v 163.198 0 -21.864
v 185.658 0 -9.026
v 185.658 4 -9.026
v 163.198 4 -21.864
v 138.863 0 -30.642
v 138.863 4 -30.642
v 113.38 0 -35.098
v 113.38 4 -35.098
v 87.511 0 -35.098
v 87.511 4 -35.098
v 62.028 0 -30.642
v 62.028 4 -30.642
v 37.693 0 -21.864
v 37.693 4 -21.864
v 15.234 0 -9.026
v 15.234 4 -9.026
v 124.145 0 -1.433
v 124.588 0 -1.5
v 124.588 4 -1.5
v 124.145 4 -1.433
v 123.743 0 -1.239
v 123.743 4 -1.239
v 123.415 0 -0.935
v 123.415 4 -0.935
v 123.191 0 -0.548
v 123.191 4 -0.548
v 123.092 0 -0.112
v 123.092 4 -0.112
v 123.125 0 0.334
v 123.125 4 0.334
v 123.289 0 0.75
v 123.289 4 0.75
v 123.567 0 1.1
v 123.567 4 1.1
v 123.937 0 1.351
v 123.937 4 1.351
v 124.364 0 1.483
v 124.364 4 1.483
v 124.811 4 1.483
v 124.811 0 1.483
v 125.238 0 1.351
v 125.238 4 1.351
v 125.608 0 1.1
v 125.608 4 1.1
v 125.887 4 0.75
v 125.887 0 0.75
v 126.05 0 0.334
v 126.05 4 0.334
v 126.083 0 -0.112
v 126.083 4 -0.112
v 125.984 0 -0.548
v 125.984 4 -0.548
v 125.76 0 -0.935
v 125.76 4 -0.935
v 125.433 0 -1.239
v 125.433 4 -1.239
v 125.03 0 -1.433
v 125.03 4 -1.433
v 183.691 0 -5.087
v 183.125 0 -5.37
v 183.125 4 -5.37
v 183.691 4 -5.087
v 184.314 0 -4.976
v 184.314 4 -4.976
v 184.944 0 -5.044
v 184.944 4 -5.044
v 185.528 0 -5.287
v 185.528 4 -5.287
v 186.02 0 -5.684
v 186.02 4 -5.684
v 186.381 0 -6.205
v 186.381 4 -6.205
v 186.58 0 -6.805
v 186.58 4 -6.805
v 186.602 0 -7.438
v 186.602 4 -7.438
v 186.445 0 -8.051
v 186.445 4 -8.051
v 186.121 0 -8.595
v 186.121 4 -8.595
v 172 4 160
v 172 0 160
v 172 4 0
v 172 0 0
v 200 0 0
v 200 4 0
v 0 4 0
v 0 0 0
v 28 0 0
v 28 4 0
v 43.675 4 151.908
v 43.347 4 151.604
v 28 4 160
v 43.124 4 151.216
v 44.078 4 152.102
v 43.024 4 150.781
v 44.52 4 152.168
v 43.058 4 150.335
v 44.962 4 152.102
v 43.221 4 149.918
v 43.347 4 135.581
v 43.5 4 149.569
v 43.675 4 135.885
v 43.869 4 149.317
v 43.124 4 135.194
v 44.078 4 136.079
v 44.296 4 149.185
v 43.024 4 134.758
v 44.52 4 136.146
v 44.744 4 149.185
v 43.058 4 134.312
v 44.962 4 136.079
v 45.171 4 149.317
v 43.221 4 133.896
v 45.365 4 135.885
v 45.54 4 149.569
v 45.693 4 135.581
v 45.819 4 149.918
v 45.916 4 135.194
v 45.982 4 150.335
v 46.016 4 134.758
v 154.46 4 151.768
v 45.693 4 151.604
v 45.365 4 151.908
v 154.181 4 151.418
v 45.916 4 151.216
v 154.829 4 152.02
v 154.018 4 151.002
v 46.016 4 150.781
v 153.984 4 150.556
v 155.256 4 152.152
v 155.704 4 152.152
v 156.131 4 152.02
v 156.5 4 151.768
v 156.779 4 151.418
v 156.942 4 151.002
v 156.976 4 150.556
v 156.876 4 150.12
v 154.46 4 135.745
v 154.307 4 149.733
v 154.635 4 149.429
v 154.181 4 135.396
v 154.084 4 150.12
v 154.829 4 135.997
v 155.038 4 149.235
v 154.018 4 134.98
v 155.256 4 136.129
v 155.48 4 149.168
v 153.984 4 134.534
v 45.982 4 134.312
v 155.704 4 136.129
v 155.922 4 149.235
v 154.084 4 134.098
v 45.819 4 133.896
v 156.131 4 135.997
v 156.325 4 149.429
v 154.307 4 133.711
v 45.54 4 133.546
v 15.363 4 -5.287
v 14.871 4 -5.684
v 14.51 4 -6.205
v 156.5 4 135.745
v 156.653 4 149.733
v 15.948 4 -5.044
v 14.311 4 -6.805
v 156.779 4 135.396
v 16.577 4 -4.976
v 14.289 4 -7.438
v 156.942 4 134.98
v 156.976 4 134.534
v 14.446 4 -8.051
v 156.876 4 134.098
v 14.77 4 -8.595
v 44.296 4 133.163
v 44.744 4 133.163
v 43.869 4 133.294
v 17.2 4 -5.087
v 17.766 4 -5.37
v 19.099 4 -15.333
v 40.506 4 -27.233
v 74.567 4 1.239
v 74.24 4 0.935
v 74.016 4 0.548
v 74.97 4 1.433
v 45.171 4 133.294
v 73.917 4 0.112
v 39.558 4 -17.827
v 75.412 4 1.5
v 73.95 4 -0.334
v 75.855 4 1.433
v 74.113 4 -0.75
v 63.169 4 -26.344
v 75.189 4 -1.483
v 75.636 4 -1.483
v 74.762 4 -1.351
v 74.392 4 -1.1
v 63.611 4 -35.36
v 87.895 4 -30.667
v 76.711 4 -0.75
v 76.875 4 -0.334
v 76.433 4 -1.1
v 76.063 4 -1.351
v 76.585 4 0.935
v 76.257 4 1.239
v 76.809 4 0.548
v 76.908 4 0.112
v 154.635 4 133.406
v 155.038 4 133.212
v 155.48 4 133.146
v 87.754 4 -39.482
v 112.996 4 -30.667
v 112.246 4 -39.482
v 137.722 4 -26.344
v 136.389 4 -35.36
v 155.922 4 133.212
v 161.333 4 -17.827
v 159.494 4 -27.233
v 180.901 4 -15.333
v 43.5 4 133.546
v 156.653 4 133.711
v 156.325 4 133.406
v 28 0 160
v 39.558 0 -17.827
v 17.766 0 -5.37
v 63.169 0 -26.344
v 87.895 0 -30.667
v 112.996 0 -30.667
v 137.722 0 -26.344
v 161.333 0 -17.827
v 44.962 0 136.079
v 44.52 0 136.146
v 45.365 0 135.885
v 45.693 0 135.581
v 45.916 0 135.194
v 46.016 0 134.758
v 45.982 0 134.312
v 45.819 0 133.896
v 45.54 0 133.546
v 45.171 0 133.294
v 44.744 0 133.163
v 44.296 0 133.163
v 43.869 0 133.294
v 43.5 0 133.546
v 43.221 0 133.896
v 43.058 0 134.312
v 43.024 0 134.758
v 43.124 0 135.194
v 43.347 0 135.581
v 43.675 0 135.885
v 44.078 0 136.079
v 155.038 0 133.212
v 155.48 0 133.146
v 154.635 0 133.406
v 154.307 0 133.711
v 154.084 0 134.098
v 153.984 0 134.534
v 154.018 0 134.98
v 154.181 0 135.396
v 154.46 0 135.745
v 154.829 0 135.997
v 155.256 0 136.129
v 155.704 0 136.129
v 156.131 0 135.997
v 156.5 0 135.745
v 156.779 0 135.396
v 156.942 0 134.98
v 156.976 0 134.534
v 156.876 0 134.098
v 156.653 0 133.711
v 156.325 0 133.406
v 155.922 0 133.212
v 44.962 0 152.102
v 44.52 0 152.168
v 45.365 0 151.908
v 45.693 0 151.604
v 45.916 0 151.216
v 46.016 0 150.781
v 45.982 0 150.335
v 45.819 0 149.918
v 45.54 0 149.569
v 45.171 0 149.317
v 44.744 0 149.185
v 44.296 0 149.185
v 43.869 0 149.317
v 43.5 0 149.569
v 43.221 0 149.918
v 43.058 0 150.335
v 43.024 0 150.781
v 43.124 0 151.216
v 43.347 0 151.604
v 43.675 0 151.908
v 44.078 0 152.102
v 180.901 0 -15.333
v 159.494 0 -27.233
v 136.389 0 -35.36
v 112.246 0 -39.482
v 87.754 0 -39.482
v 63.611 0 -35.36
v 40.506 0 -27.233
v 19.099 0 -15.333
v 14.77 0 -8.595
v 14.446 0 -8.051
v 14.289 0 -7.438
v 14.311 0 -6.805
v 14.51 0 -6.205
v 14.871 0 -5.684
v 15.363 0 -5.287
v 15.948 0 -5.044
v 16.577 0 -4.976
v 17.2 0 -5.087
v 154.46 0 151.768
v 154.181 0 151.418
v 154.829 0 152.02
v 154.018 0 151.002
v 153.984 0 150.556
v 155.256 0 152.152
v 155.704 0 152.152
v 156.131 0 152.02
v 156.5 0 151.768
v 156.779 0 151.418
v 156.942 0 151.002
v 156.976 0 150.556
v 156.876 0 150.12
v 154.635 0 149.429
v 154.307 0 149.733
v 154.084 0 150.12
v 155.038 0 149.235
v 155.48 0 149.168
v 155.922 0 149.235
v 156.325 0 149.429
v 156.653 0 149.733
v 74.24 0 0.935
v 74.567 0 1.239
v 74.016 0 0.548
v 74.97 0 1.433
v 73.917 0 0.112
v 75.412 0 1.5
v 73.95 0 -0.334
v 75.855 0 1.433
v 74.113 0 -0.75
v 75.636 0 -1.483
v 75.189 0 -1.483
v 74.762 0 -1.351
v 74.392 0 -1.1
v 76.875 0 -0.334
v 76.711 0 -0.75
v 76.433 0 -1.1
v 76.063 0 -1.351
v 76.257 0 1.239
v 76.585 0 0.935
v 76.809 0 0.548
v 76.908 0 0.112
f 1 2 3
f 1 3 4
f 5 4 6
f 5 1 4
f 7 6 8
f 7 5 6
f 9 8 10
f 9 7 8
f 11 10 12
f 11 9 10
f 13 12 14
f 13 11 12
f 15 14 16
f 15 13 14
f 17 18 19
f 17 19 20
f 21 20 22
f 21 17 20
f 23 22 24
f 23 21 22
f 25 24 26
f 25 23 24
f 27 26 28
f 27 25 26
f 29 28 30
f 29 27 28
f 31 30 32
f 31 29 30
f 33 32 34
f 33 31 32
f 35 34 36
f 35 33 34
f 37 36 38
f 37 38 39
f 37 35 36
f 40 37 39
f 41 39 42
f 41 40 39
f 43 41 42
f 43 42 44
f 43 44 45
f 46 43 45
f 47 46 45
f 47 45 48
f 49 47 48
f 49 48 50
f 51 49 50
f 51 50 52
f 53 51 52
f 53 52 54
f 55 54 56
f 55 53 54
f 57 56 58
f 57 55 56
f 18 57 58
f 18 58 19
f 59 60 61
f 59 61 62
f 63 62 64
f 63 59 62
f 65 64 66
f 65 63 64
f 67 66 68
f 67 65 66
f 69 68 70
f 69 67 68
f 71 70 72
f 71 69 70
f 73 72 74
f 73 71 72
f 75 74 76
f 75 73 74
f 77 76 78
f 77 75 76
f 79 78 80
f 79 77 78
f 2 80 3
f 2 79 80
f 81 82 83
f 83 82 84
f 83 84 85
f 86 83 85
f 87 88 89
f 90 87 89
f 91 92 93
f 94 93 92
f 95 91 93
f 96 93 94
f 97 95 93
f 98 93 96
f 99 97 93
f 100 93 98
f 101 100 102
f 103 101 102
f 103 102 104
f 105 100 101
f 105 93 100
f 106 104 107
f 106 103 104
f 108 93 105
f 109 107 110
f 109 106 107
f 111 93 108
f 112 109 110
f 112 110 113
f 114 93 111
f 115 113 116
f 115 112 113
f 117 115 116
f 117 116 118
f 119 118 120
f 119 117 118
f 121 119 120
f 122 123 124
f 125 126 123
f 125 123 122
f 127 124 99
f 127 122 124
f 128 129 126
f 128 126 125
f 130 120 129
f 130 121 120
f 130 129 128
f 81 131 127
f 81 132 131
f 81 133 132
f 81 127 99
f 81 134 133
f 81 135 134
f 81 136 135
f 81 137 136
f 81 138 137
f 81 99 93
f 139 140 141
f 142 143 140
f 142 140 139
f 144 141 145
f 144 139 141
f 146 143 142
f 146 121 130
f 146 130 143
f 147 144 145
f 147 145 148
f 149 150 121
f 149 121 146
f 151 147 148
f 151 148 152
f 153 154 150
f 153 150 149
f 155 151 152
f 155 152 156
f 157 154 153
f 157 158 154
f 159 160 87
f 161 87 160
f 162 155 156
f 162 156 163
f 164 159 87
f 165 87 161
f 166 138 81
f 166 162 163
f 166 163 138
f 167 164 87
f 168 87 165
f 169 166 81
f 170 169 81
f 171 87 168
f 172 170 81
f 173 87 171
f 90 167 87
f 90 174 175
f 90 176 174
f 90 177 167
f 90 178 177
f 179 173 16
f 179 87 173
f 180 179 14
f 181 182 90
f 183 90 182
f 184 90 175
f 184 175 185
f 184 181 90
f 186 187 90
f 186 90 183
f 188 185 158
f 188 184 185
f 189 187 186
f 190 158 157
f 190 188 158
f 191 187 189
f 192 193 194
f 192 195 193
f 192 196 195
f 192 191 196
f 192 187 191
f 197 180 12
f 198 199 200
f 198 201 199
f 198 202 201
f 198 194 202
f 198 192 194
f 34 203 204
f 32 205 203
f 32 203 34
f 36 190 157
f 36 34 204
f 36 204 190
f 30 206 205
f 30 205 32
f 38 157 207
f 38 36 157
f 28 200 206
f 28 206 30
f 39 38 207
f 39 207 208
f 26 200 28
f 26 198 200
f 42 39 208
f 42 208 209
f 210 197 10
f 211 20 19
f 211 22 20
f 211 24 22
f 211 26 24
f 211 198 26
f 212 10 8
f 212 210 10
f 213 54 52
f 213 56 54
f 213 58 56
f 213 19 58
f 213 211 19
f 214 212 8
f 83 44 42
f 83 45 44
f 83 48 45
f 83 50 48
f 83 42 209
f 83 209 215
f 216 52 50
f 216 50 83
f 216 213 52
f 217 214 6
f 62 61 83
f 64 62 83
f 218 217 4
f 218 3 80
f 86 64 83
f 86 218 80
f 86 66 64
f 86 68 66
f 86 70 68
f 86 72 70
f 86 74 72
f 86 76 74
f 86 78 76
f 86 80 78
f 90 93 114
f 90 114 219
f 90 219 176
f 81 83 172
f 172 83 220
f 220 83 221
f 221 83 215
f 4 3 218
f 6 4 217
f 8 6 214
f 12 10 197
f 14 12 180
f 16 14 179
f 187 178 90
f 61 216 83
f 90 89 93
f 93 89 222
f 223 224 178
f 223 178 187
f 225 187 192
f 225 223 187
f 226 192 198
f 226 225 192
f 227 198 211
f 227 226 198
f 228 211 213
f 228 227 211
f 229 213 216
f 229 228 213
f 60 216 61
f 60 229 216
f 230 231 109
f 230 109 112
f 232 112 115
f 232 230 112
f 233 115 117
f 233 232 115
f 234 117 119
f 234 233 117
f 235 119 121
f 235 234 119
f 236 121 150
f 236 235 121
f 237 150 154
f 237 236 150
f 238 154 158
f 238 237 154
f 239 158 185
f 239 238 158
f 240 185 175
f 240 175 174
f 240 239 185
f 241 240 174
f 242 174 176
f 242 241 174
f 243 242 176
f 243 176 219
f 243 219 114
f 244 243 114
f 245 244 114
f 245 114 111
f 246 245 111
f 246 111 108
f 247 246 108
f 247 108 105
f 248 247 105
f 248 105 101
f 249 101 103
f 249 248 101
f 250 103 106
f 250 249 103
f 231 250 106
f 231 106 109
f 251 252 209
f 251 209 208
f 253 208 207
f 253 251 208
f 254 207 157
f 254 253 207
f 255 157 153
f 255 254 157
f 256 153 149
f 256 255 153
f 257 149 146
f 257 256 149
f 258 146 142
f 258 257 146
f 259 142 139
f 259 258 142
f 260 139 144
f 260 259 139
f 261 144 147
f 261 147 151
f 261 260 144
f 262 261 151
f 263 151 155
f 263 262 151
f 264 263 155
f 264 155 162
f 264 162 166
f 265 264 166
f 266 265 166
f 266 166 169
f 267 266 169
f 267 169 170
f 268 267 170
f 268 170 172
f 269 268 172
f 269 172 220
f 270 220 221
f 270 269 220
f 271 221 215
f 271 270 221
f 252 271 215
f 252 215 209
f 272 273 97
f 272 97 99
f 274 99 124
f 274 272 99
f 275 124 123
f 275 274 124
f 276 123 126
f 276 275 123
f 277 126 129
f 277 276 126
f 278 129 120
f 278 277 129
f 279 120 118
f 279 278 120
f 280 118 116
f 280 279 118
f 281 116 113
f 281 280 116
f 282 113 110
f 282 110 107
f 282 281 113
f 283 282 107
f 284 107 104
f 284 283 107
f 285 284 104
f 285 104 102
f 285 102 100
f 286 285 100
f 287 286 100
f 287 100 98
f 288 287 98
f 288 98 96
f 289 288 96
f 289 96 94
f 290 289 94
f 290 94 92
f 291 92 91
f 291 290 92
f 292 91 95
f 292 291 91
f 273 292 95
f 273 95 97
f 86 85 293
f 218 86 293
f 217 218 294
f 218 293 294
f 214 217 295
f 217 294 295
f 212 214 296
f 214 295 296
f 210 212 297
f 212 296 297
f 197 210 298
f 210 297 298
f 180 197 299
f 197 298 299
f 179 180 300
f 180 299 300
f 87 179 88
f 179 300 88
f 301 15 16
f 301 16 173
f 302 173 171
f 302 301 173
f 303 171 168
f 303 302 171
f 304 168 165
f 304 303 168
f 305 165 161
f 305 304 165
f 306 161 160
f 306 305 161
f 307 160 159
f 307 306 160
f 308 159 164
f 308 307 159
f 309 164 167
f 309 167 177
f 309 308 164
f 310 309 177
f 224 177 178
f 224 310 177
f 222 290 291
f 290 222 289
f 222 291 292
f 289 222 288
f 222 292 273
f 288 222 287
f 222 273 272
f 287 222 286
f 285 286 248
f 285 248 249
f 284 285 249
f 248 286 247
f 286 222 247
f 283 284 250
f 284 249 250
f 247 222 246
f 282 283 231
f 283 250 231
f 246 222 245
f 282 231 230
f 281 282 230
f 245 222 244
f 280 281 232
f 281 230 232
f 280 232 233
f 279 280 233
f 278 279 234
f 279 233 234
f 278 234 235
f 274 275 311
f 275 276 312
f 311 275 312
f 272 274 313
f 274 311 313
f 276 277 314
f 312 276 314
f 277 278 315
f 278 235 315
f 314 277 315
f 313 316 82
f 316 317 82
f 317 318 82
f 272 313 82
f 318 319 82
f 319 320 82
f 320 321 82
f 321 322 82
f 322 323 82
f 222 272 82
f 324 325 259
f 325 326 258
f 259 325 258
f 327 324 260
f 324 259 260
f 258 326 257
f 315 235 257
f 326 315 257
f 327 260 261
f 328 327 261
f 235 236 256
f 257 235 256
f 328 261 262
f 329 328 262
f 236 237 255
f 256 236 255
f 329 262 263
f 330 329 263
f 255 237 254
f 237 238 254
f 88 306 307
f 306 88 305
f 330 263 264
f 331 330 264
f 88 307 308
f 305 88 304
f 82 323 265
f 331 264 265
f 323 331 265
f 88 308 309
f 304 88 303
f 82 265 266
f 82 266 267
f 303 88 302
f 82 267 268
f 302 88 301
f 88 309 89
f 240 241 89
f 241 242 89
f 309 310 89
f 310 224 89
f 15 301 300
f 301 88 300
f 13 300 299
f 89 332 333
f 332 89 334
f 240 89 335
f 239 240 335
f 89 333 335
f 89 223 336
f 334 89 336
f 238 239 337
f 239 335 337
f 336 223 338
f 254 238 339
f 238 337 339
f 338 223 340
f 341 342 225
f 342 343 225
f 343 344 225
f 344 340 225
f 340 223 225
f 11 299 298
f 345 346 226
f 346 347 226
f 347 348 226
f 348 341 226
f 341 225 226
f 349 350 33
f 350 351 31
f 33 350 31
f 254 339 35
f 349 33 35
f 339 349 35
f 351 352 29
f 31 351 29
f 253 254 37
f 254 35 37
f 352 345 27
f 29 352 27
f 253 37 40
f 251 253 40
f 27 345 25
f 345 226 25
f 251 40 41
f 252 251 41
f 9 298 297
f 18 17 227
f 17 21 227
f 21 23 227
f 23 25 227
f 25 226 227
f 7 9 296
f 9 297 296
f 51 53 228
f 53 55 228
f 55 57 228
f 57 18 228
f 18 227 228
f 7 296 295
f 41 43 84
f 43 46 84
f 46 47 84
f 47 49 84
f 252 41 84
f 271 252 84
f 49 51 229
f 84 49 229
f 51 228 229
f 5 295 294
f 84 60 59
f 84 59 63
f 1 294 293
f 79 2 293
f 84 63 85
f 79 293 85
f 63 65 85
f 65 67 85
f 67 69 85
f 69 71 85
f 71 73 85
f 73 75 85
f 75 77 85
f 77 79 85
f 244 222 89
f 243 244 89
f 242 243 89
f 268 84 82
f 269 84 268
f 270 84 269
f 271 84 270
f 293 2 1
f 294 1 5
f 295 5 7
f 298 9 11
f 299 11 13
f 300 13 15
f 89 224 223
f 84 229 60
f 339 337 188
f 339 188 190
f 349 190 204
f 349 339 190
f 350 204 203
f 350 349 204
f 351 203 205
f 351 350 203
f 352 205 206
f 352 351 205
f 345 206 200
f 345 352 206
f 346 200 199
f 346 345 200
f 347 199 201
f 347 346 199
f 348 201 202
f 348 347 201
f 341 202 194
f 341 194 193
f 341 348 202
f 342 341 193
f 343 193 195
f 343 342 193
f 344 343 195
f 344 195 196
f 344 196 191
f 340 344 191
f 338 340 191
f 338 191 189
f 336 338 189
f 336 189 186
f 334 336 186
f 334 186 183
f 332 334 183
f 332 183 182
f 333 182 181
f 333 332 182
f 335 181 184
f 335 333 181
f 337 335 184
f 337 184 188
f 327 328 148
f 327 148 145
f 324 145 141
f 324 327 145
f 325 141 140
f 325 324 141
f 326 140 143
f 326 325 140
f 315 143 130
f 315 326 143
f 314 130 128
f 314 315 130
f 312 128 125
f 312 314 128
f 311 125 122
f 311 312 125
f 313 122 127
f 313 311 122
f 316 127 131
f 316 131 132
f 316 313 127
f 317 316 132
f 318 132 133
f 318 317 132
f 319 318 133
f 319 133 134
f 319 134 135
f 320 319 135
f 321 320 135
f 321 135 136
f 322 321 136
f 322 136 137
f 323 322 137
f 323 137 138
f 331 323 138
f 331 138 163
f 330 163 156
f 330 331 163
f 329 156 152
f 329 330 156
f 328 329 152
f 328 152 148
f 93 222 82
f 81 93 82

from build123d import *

# Parameters (mm, degrees)
ESQUISSE2_R        = 1.5
BOSS_EXTRU_1_DEPTH = 4


with BuildPart() as part:
    # Esquisse2 → Boss.-Extru.1 (new body)
    with BuildSketch(Plane(origin=(0, 0, 0), x_dir=(1, 0, 0), z_dir=(0, 1, 0))):
        with BuildLine():
            Line((0, 0), (28, 0))
            Line((28, 0), (28, -160))
            Line((28, -160), (172, -160))
            Line((172, -160), (172, 0))
            Line((172, 0), (200, 0))
            ThreePointArc((200, 0), (100, 40), (0, 0))
        make_face()
        with Locations(Location((44.519959109, -134.645808038, 0), (0, 0, 270))):
            Circle(ESQUISSE2_R, mode=Mode.SUBTRACT)
        with Locations(Location((44.519959109, -150.668405535, 0), (0, 0, 270))):
            Circle(ESQUISSE2_R, mode=Mode.SUBTRACT)
        with Locations(Location((155.480040891, -150.668405535, 0), (0, 0, 90))):
            Circle(ESQUISSE2_R, mode=Mode.SUBTRACT)
        with Locations(Location((155.480040891, -134.645808038, 0), (0, 0, 90))):
            Circle(ESQUISSE2_R, mode=Mode.SUBTRACT)
        with Locations(Location((75.412395646, 0, 0), (0, 0, 270))):
            Circle(ESQUISSE2_R, mode=Mode.SUBTRACT)
        with Locations(Location((124.587604354, 0, 0), (0, 0, 90))):
            Circle(ESQUISSE2_R, mode=Mode.SUBTRACT)
        with BuildLine():
            ThreePointArc((185.657545612, 9.025506382), (100.445588201, 35.657742009), (15.23363079, 9.025506382))
            ThreePointArc((15.23363079, 9.025506382), (14.672053701, 5.931560858), (17.765999225, 5.369983769))
            ThreePointArc((17.765999225, 5.369983769), (100.445588201, 31.210750277), (183.125177177, 5.369983769))
            ThreePointArc((183.125177177, 5.369983769), (186.219122701, 5.931560858), (185.657545612, 9.025506382))
        make_face(mode=Mode.SUBTRACT)
    extrude(amount=BOSS_EXTRU_1_DEPTH)


solid = part.part
